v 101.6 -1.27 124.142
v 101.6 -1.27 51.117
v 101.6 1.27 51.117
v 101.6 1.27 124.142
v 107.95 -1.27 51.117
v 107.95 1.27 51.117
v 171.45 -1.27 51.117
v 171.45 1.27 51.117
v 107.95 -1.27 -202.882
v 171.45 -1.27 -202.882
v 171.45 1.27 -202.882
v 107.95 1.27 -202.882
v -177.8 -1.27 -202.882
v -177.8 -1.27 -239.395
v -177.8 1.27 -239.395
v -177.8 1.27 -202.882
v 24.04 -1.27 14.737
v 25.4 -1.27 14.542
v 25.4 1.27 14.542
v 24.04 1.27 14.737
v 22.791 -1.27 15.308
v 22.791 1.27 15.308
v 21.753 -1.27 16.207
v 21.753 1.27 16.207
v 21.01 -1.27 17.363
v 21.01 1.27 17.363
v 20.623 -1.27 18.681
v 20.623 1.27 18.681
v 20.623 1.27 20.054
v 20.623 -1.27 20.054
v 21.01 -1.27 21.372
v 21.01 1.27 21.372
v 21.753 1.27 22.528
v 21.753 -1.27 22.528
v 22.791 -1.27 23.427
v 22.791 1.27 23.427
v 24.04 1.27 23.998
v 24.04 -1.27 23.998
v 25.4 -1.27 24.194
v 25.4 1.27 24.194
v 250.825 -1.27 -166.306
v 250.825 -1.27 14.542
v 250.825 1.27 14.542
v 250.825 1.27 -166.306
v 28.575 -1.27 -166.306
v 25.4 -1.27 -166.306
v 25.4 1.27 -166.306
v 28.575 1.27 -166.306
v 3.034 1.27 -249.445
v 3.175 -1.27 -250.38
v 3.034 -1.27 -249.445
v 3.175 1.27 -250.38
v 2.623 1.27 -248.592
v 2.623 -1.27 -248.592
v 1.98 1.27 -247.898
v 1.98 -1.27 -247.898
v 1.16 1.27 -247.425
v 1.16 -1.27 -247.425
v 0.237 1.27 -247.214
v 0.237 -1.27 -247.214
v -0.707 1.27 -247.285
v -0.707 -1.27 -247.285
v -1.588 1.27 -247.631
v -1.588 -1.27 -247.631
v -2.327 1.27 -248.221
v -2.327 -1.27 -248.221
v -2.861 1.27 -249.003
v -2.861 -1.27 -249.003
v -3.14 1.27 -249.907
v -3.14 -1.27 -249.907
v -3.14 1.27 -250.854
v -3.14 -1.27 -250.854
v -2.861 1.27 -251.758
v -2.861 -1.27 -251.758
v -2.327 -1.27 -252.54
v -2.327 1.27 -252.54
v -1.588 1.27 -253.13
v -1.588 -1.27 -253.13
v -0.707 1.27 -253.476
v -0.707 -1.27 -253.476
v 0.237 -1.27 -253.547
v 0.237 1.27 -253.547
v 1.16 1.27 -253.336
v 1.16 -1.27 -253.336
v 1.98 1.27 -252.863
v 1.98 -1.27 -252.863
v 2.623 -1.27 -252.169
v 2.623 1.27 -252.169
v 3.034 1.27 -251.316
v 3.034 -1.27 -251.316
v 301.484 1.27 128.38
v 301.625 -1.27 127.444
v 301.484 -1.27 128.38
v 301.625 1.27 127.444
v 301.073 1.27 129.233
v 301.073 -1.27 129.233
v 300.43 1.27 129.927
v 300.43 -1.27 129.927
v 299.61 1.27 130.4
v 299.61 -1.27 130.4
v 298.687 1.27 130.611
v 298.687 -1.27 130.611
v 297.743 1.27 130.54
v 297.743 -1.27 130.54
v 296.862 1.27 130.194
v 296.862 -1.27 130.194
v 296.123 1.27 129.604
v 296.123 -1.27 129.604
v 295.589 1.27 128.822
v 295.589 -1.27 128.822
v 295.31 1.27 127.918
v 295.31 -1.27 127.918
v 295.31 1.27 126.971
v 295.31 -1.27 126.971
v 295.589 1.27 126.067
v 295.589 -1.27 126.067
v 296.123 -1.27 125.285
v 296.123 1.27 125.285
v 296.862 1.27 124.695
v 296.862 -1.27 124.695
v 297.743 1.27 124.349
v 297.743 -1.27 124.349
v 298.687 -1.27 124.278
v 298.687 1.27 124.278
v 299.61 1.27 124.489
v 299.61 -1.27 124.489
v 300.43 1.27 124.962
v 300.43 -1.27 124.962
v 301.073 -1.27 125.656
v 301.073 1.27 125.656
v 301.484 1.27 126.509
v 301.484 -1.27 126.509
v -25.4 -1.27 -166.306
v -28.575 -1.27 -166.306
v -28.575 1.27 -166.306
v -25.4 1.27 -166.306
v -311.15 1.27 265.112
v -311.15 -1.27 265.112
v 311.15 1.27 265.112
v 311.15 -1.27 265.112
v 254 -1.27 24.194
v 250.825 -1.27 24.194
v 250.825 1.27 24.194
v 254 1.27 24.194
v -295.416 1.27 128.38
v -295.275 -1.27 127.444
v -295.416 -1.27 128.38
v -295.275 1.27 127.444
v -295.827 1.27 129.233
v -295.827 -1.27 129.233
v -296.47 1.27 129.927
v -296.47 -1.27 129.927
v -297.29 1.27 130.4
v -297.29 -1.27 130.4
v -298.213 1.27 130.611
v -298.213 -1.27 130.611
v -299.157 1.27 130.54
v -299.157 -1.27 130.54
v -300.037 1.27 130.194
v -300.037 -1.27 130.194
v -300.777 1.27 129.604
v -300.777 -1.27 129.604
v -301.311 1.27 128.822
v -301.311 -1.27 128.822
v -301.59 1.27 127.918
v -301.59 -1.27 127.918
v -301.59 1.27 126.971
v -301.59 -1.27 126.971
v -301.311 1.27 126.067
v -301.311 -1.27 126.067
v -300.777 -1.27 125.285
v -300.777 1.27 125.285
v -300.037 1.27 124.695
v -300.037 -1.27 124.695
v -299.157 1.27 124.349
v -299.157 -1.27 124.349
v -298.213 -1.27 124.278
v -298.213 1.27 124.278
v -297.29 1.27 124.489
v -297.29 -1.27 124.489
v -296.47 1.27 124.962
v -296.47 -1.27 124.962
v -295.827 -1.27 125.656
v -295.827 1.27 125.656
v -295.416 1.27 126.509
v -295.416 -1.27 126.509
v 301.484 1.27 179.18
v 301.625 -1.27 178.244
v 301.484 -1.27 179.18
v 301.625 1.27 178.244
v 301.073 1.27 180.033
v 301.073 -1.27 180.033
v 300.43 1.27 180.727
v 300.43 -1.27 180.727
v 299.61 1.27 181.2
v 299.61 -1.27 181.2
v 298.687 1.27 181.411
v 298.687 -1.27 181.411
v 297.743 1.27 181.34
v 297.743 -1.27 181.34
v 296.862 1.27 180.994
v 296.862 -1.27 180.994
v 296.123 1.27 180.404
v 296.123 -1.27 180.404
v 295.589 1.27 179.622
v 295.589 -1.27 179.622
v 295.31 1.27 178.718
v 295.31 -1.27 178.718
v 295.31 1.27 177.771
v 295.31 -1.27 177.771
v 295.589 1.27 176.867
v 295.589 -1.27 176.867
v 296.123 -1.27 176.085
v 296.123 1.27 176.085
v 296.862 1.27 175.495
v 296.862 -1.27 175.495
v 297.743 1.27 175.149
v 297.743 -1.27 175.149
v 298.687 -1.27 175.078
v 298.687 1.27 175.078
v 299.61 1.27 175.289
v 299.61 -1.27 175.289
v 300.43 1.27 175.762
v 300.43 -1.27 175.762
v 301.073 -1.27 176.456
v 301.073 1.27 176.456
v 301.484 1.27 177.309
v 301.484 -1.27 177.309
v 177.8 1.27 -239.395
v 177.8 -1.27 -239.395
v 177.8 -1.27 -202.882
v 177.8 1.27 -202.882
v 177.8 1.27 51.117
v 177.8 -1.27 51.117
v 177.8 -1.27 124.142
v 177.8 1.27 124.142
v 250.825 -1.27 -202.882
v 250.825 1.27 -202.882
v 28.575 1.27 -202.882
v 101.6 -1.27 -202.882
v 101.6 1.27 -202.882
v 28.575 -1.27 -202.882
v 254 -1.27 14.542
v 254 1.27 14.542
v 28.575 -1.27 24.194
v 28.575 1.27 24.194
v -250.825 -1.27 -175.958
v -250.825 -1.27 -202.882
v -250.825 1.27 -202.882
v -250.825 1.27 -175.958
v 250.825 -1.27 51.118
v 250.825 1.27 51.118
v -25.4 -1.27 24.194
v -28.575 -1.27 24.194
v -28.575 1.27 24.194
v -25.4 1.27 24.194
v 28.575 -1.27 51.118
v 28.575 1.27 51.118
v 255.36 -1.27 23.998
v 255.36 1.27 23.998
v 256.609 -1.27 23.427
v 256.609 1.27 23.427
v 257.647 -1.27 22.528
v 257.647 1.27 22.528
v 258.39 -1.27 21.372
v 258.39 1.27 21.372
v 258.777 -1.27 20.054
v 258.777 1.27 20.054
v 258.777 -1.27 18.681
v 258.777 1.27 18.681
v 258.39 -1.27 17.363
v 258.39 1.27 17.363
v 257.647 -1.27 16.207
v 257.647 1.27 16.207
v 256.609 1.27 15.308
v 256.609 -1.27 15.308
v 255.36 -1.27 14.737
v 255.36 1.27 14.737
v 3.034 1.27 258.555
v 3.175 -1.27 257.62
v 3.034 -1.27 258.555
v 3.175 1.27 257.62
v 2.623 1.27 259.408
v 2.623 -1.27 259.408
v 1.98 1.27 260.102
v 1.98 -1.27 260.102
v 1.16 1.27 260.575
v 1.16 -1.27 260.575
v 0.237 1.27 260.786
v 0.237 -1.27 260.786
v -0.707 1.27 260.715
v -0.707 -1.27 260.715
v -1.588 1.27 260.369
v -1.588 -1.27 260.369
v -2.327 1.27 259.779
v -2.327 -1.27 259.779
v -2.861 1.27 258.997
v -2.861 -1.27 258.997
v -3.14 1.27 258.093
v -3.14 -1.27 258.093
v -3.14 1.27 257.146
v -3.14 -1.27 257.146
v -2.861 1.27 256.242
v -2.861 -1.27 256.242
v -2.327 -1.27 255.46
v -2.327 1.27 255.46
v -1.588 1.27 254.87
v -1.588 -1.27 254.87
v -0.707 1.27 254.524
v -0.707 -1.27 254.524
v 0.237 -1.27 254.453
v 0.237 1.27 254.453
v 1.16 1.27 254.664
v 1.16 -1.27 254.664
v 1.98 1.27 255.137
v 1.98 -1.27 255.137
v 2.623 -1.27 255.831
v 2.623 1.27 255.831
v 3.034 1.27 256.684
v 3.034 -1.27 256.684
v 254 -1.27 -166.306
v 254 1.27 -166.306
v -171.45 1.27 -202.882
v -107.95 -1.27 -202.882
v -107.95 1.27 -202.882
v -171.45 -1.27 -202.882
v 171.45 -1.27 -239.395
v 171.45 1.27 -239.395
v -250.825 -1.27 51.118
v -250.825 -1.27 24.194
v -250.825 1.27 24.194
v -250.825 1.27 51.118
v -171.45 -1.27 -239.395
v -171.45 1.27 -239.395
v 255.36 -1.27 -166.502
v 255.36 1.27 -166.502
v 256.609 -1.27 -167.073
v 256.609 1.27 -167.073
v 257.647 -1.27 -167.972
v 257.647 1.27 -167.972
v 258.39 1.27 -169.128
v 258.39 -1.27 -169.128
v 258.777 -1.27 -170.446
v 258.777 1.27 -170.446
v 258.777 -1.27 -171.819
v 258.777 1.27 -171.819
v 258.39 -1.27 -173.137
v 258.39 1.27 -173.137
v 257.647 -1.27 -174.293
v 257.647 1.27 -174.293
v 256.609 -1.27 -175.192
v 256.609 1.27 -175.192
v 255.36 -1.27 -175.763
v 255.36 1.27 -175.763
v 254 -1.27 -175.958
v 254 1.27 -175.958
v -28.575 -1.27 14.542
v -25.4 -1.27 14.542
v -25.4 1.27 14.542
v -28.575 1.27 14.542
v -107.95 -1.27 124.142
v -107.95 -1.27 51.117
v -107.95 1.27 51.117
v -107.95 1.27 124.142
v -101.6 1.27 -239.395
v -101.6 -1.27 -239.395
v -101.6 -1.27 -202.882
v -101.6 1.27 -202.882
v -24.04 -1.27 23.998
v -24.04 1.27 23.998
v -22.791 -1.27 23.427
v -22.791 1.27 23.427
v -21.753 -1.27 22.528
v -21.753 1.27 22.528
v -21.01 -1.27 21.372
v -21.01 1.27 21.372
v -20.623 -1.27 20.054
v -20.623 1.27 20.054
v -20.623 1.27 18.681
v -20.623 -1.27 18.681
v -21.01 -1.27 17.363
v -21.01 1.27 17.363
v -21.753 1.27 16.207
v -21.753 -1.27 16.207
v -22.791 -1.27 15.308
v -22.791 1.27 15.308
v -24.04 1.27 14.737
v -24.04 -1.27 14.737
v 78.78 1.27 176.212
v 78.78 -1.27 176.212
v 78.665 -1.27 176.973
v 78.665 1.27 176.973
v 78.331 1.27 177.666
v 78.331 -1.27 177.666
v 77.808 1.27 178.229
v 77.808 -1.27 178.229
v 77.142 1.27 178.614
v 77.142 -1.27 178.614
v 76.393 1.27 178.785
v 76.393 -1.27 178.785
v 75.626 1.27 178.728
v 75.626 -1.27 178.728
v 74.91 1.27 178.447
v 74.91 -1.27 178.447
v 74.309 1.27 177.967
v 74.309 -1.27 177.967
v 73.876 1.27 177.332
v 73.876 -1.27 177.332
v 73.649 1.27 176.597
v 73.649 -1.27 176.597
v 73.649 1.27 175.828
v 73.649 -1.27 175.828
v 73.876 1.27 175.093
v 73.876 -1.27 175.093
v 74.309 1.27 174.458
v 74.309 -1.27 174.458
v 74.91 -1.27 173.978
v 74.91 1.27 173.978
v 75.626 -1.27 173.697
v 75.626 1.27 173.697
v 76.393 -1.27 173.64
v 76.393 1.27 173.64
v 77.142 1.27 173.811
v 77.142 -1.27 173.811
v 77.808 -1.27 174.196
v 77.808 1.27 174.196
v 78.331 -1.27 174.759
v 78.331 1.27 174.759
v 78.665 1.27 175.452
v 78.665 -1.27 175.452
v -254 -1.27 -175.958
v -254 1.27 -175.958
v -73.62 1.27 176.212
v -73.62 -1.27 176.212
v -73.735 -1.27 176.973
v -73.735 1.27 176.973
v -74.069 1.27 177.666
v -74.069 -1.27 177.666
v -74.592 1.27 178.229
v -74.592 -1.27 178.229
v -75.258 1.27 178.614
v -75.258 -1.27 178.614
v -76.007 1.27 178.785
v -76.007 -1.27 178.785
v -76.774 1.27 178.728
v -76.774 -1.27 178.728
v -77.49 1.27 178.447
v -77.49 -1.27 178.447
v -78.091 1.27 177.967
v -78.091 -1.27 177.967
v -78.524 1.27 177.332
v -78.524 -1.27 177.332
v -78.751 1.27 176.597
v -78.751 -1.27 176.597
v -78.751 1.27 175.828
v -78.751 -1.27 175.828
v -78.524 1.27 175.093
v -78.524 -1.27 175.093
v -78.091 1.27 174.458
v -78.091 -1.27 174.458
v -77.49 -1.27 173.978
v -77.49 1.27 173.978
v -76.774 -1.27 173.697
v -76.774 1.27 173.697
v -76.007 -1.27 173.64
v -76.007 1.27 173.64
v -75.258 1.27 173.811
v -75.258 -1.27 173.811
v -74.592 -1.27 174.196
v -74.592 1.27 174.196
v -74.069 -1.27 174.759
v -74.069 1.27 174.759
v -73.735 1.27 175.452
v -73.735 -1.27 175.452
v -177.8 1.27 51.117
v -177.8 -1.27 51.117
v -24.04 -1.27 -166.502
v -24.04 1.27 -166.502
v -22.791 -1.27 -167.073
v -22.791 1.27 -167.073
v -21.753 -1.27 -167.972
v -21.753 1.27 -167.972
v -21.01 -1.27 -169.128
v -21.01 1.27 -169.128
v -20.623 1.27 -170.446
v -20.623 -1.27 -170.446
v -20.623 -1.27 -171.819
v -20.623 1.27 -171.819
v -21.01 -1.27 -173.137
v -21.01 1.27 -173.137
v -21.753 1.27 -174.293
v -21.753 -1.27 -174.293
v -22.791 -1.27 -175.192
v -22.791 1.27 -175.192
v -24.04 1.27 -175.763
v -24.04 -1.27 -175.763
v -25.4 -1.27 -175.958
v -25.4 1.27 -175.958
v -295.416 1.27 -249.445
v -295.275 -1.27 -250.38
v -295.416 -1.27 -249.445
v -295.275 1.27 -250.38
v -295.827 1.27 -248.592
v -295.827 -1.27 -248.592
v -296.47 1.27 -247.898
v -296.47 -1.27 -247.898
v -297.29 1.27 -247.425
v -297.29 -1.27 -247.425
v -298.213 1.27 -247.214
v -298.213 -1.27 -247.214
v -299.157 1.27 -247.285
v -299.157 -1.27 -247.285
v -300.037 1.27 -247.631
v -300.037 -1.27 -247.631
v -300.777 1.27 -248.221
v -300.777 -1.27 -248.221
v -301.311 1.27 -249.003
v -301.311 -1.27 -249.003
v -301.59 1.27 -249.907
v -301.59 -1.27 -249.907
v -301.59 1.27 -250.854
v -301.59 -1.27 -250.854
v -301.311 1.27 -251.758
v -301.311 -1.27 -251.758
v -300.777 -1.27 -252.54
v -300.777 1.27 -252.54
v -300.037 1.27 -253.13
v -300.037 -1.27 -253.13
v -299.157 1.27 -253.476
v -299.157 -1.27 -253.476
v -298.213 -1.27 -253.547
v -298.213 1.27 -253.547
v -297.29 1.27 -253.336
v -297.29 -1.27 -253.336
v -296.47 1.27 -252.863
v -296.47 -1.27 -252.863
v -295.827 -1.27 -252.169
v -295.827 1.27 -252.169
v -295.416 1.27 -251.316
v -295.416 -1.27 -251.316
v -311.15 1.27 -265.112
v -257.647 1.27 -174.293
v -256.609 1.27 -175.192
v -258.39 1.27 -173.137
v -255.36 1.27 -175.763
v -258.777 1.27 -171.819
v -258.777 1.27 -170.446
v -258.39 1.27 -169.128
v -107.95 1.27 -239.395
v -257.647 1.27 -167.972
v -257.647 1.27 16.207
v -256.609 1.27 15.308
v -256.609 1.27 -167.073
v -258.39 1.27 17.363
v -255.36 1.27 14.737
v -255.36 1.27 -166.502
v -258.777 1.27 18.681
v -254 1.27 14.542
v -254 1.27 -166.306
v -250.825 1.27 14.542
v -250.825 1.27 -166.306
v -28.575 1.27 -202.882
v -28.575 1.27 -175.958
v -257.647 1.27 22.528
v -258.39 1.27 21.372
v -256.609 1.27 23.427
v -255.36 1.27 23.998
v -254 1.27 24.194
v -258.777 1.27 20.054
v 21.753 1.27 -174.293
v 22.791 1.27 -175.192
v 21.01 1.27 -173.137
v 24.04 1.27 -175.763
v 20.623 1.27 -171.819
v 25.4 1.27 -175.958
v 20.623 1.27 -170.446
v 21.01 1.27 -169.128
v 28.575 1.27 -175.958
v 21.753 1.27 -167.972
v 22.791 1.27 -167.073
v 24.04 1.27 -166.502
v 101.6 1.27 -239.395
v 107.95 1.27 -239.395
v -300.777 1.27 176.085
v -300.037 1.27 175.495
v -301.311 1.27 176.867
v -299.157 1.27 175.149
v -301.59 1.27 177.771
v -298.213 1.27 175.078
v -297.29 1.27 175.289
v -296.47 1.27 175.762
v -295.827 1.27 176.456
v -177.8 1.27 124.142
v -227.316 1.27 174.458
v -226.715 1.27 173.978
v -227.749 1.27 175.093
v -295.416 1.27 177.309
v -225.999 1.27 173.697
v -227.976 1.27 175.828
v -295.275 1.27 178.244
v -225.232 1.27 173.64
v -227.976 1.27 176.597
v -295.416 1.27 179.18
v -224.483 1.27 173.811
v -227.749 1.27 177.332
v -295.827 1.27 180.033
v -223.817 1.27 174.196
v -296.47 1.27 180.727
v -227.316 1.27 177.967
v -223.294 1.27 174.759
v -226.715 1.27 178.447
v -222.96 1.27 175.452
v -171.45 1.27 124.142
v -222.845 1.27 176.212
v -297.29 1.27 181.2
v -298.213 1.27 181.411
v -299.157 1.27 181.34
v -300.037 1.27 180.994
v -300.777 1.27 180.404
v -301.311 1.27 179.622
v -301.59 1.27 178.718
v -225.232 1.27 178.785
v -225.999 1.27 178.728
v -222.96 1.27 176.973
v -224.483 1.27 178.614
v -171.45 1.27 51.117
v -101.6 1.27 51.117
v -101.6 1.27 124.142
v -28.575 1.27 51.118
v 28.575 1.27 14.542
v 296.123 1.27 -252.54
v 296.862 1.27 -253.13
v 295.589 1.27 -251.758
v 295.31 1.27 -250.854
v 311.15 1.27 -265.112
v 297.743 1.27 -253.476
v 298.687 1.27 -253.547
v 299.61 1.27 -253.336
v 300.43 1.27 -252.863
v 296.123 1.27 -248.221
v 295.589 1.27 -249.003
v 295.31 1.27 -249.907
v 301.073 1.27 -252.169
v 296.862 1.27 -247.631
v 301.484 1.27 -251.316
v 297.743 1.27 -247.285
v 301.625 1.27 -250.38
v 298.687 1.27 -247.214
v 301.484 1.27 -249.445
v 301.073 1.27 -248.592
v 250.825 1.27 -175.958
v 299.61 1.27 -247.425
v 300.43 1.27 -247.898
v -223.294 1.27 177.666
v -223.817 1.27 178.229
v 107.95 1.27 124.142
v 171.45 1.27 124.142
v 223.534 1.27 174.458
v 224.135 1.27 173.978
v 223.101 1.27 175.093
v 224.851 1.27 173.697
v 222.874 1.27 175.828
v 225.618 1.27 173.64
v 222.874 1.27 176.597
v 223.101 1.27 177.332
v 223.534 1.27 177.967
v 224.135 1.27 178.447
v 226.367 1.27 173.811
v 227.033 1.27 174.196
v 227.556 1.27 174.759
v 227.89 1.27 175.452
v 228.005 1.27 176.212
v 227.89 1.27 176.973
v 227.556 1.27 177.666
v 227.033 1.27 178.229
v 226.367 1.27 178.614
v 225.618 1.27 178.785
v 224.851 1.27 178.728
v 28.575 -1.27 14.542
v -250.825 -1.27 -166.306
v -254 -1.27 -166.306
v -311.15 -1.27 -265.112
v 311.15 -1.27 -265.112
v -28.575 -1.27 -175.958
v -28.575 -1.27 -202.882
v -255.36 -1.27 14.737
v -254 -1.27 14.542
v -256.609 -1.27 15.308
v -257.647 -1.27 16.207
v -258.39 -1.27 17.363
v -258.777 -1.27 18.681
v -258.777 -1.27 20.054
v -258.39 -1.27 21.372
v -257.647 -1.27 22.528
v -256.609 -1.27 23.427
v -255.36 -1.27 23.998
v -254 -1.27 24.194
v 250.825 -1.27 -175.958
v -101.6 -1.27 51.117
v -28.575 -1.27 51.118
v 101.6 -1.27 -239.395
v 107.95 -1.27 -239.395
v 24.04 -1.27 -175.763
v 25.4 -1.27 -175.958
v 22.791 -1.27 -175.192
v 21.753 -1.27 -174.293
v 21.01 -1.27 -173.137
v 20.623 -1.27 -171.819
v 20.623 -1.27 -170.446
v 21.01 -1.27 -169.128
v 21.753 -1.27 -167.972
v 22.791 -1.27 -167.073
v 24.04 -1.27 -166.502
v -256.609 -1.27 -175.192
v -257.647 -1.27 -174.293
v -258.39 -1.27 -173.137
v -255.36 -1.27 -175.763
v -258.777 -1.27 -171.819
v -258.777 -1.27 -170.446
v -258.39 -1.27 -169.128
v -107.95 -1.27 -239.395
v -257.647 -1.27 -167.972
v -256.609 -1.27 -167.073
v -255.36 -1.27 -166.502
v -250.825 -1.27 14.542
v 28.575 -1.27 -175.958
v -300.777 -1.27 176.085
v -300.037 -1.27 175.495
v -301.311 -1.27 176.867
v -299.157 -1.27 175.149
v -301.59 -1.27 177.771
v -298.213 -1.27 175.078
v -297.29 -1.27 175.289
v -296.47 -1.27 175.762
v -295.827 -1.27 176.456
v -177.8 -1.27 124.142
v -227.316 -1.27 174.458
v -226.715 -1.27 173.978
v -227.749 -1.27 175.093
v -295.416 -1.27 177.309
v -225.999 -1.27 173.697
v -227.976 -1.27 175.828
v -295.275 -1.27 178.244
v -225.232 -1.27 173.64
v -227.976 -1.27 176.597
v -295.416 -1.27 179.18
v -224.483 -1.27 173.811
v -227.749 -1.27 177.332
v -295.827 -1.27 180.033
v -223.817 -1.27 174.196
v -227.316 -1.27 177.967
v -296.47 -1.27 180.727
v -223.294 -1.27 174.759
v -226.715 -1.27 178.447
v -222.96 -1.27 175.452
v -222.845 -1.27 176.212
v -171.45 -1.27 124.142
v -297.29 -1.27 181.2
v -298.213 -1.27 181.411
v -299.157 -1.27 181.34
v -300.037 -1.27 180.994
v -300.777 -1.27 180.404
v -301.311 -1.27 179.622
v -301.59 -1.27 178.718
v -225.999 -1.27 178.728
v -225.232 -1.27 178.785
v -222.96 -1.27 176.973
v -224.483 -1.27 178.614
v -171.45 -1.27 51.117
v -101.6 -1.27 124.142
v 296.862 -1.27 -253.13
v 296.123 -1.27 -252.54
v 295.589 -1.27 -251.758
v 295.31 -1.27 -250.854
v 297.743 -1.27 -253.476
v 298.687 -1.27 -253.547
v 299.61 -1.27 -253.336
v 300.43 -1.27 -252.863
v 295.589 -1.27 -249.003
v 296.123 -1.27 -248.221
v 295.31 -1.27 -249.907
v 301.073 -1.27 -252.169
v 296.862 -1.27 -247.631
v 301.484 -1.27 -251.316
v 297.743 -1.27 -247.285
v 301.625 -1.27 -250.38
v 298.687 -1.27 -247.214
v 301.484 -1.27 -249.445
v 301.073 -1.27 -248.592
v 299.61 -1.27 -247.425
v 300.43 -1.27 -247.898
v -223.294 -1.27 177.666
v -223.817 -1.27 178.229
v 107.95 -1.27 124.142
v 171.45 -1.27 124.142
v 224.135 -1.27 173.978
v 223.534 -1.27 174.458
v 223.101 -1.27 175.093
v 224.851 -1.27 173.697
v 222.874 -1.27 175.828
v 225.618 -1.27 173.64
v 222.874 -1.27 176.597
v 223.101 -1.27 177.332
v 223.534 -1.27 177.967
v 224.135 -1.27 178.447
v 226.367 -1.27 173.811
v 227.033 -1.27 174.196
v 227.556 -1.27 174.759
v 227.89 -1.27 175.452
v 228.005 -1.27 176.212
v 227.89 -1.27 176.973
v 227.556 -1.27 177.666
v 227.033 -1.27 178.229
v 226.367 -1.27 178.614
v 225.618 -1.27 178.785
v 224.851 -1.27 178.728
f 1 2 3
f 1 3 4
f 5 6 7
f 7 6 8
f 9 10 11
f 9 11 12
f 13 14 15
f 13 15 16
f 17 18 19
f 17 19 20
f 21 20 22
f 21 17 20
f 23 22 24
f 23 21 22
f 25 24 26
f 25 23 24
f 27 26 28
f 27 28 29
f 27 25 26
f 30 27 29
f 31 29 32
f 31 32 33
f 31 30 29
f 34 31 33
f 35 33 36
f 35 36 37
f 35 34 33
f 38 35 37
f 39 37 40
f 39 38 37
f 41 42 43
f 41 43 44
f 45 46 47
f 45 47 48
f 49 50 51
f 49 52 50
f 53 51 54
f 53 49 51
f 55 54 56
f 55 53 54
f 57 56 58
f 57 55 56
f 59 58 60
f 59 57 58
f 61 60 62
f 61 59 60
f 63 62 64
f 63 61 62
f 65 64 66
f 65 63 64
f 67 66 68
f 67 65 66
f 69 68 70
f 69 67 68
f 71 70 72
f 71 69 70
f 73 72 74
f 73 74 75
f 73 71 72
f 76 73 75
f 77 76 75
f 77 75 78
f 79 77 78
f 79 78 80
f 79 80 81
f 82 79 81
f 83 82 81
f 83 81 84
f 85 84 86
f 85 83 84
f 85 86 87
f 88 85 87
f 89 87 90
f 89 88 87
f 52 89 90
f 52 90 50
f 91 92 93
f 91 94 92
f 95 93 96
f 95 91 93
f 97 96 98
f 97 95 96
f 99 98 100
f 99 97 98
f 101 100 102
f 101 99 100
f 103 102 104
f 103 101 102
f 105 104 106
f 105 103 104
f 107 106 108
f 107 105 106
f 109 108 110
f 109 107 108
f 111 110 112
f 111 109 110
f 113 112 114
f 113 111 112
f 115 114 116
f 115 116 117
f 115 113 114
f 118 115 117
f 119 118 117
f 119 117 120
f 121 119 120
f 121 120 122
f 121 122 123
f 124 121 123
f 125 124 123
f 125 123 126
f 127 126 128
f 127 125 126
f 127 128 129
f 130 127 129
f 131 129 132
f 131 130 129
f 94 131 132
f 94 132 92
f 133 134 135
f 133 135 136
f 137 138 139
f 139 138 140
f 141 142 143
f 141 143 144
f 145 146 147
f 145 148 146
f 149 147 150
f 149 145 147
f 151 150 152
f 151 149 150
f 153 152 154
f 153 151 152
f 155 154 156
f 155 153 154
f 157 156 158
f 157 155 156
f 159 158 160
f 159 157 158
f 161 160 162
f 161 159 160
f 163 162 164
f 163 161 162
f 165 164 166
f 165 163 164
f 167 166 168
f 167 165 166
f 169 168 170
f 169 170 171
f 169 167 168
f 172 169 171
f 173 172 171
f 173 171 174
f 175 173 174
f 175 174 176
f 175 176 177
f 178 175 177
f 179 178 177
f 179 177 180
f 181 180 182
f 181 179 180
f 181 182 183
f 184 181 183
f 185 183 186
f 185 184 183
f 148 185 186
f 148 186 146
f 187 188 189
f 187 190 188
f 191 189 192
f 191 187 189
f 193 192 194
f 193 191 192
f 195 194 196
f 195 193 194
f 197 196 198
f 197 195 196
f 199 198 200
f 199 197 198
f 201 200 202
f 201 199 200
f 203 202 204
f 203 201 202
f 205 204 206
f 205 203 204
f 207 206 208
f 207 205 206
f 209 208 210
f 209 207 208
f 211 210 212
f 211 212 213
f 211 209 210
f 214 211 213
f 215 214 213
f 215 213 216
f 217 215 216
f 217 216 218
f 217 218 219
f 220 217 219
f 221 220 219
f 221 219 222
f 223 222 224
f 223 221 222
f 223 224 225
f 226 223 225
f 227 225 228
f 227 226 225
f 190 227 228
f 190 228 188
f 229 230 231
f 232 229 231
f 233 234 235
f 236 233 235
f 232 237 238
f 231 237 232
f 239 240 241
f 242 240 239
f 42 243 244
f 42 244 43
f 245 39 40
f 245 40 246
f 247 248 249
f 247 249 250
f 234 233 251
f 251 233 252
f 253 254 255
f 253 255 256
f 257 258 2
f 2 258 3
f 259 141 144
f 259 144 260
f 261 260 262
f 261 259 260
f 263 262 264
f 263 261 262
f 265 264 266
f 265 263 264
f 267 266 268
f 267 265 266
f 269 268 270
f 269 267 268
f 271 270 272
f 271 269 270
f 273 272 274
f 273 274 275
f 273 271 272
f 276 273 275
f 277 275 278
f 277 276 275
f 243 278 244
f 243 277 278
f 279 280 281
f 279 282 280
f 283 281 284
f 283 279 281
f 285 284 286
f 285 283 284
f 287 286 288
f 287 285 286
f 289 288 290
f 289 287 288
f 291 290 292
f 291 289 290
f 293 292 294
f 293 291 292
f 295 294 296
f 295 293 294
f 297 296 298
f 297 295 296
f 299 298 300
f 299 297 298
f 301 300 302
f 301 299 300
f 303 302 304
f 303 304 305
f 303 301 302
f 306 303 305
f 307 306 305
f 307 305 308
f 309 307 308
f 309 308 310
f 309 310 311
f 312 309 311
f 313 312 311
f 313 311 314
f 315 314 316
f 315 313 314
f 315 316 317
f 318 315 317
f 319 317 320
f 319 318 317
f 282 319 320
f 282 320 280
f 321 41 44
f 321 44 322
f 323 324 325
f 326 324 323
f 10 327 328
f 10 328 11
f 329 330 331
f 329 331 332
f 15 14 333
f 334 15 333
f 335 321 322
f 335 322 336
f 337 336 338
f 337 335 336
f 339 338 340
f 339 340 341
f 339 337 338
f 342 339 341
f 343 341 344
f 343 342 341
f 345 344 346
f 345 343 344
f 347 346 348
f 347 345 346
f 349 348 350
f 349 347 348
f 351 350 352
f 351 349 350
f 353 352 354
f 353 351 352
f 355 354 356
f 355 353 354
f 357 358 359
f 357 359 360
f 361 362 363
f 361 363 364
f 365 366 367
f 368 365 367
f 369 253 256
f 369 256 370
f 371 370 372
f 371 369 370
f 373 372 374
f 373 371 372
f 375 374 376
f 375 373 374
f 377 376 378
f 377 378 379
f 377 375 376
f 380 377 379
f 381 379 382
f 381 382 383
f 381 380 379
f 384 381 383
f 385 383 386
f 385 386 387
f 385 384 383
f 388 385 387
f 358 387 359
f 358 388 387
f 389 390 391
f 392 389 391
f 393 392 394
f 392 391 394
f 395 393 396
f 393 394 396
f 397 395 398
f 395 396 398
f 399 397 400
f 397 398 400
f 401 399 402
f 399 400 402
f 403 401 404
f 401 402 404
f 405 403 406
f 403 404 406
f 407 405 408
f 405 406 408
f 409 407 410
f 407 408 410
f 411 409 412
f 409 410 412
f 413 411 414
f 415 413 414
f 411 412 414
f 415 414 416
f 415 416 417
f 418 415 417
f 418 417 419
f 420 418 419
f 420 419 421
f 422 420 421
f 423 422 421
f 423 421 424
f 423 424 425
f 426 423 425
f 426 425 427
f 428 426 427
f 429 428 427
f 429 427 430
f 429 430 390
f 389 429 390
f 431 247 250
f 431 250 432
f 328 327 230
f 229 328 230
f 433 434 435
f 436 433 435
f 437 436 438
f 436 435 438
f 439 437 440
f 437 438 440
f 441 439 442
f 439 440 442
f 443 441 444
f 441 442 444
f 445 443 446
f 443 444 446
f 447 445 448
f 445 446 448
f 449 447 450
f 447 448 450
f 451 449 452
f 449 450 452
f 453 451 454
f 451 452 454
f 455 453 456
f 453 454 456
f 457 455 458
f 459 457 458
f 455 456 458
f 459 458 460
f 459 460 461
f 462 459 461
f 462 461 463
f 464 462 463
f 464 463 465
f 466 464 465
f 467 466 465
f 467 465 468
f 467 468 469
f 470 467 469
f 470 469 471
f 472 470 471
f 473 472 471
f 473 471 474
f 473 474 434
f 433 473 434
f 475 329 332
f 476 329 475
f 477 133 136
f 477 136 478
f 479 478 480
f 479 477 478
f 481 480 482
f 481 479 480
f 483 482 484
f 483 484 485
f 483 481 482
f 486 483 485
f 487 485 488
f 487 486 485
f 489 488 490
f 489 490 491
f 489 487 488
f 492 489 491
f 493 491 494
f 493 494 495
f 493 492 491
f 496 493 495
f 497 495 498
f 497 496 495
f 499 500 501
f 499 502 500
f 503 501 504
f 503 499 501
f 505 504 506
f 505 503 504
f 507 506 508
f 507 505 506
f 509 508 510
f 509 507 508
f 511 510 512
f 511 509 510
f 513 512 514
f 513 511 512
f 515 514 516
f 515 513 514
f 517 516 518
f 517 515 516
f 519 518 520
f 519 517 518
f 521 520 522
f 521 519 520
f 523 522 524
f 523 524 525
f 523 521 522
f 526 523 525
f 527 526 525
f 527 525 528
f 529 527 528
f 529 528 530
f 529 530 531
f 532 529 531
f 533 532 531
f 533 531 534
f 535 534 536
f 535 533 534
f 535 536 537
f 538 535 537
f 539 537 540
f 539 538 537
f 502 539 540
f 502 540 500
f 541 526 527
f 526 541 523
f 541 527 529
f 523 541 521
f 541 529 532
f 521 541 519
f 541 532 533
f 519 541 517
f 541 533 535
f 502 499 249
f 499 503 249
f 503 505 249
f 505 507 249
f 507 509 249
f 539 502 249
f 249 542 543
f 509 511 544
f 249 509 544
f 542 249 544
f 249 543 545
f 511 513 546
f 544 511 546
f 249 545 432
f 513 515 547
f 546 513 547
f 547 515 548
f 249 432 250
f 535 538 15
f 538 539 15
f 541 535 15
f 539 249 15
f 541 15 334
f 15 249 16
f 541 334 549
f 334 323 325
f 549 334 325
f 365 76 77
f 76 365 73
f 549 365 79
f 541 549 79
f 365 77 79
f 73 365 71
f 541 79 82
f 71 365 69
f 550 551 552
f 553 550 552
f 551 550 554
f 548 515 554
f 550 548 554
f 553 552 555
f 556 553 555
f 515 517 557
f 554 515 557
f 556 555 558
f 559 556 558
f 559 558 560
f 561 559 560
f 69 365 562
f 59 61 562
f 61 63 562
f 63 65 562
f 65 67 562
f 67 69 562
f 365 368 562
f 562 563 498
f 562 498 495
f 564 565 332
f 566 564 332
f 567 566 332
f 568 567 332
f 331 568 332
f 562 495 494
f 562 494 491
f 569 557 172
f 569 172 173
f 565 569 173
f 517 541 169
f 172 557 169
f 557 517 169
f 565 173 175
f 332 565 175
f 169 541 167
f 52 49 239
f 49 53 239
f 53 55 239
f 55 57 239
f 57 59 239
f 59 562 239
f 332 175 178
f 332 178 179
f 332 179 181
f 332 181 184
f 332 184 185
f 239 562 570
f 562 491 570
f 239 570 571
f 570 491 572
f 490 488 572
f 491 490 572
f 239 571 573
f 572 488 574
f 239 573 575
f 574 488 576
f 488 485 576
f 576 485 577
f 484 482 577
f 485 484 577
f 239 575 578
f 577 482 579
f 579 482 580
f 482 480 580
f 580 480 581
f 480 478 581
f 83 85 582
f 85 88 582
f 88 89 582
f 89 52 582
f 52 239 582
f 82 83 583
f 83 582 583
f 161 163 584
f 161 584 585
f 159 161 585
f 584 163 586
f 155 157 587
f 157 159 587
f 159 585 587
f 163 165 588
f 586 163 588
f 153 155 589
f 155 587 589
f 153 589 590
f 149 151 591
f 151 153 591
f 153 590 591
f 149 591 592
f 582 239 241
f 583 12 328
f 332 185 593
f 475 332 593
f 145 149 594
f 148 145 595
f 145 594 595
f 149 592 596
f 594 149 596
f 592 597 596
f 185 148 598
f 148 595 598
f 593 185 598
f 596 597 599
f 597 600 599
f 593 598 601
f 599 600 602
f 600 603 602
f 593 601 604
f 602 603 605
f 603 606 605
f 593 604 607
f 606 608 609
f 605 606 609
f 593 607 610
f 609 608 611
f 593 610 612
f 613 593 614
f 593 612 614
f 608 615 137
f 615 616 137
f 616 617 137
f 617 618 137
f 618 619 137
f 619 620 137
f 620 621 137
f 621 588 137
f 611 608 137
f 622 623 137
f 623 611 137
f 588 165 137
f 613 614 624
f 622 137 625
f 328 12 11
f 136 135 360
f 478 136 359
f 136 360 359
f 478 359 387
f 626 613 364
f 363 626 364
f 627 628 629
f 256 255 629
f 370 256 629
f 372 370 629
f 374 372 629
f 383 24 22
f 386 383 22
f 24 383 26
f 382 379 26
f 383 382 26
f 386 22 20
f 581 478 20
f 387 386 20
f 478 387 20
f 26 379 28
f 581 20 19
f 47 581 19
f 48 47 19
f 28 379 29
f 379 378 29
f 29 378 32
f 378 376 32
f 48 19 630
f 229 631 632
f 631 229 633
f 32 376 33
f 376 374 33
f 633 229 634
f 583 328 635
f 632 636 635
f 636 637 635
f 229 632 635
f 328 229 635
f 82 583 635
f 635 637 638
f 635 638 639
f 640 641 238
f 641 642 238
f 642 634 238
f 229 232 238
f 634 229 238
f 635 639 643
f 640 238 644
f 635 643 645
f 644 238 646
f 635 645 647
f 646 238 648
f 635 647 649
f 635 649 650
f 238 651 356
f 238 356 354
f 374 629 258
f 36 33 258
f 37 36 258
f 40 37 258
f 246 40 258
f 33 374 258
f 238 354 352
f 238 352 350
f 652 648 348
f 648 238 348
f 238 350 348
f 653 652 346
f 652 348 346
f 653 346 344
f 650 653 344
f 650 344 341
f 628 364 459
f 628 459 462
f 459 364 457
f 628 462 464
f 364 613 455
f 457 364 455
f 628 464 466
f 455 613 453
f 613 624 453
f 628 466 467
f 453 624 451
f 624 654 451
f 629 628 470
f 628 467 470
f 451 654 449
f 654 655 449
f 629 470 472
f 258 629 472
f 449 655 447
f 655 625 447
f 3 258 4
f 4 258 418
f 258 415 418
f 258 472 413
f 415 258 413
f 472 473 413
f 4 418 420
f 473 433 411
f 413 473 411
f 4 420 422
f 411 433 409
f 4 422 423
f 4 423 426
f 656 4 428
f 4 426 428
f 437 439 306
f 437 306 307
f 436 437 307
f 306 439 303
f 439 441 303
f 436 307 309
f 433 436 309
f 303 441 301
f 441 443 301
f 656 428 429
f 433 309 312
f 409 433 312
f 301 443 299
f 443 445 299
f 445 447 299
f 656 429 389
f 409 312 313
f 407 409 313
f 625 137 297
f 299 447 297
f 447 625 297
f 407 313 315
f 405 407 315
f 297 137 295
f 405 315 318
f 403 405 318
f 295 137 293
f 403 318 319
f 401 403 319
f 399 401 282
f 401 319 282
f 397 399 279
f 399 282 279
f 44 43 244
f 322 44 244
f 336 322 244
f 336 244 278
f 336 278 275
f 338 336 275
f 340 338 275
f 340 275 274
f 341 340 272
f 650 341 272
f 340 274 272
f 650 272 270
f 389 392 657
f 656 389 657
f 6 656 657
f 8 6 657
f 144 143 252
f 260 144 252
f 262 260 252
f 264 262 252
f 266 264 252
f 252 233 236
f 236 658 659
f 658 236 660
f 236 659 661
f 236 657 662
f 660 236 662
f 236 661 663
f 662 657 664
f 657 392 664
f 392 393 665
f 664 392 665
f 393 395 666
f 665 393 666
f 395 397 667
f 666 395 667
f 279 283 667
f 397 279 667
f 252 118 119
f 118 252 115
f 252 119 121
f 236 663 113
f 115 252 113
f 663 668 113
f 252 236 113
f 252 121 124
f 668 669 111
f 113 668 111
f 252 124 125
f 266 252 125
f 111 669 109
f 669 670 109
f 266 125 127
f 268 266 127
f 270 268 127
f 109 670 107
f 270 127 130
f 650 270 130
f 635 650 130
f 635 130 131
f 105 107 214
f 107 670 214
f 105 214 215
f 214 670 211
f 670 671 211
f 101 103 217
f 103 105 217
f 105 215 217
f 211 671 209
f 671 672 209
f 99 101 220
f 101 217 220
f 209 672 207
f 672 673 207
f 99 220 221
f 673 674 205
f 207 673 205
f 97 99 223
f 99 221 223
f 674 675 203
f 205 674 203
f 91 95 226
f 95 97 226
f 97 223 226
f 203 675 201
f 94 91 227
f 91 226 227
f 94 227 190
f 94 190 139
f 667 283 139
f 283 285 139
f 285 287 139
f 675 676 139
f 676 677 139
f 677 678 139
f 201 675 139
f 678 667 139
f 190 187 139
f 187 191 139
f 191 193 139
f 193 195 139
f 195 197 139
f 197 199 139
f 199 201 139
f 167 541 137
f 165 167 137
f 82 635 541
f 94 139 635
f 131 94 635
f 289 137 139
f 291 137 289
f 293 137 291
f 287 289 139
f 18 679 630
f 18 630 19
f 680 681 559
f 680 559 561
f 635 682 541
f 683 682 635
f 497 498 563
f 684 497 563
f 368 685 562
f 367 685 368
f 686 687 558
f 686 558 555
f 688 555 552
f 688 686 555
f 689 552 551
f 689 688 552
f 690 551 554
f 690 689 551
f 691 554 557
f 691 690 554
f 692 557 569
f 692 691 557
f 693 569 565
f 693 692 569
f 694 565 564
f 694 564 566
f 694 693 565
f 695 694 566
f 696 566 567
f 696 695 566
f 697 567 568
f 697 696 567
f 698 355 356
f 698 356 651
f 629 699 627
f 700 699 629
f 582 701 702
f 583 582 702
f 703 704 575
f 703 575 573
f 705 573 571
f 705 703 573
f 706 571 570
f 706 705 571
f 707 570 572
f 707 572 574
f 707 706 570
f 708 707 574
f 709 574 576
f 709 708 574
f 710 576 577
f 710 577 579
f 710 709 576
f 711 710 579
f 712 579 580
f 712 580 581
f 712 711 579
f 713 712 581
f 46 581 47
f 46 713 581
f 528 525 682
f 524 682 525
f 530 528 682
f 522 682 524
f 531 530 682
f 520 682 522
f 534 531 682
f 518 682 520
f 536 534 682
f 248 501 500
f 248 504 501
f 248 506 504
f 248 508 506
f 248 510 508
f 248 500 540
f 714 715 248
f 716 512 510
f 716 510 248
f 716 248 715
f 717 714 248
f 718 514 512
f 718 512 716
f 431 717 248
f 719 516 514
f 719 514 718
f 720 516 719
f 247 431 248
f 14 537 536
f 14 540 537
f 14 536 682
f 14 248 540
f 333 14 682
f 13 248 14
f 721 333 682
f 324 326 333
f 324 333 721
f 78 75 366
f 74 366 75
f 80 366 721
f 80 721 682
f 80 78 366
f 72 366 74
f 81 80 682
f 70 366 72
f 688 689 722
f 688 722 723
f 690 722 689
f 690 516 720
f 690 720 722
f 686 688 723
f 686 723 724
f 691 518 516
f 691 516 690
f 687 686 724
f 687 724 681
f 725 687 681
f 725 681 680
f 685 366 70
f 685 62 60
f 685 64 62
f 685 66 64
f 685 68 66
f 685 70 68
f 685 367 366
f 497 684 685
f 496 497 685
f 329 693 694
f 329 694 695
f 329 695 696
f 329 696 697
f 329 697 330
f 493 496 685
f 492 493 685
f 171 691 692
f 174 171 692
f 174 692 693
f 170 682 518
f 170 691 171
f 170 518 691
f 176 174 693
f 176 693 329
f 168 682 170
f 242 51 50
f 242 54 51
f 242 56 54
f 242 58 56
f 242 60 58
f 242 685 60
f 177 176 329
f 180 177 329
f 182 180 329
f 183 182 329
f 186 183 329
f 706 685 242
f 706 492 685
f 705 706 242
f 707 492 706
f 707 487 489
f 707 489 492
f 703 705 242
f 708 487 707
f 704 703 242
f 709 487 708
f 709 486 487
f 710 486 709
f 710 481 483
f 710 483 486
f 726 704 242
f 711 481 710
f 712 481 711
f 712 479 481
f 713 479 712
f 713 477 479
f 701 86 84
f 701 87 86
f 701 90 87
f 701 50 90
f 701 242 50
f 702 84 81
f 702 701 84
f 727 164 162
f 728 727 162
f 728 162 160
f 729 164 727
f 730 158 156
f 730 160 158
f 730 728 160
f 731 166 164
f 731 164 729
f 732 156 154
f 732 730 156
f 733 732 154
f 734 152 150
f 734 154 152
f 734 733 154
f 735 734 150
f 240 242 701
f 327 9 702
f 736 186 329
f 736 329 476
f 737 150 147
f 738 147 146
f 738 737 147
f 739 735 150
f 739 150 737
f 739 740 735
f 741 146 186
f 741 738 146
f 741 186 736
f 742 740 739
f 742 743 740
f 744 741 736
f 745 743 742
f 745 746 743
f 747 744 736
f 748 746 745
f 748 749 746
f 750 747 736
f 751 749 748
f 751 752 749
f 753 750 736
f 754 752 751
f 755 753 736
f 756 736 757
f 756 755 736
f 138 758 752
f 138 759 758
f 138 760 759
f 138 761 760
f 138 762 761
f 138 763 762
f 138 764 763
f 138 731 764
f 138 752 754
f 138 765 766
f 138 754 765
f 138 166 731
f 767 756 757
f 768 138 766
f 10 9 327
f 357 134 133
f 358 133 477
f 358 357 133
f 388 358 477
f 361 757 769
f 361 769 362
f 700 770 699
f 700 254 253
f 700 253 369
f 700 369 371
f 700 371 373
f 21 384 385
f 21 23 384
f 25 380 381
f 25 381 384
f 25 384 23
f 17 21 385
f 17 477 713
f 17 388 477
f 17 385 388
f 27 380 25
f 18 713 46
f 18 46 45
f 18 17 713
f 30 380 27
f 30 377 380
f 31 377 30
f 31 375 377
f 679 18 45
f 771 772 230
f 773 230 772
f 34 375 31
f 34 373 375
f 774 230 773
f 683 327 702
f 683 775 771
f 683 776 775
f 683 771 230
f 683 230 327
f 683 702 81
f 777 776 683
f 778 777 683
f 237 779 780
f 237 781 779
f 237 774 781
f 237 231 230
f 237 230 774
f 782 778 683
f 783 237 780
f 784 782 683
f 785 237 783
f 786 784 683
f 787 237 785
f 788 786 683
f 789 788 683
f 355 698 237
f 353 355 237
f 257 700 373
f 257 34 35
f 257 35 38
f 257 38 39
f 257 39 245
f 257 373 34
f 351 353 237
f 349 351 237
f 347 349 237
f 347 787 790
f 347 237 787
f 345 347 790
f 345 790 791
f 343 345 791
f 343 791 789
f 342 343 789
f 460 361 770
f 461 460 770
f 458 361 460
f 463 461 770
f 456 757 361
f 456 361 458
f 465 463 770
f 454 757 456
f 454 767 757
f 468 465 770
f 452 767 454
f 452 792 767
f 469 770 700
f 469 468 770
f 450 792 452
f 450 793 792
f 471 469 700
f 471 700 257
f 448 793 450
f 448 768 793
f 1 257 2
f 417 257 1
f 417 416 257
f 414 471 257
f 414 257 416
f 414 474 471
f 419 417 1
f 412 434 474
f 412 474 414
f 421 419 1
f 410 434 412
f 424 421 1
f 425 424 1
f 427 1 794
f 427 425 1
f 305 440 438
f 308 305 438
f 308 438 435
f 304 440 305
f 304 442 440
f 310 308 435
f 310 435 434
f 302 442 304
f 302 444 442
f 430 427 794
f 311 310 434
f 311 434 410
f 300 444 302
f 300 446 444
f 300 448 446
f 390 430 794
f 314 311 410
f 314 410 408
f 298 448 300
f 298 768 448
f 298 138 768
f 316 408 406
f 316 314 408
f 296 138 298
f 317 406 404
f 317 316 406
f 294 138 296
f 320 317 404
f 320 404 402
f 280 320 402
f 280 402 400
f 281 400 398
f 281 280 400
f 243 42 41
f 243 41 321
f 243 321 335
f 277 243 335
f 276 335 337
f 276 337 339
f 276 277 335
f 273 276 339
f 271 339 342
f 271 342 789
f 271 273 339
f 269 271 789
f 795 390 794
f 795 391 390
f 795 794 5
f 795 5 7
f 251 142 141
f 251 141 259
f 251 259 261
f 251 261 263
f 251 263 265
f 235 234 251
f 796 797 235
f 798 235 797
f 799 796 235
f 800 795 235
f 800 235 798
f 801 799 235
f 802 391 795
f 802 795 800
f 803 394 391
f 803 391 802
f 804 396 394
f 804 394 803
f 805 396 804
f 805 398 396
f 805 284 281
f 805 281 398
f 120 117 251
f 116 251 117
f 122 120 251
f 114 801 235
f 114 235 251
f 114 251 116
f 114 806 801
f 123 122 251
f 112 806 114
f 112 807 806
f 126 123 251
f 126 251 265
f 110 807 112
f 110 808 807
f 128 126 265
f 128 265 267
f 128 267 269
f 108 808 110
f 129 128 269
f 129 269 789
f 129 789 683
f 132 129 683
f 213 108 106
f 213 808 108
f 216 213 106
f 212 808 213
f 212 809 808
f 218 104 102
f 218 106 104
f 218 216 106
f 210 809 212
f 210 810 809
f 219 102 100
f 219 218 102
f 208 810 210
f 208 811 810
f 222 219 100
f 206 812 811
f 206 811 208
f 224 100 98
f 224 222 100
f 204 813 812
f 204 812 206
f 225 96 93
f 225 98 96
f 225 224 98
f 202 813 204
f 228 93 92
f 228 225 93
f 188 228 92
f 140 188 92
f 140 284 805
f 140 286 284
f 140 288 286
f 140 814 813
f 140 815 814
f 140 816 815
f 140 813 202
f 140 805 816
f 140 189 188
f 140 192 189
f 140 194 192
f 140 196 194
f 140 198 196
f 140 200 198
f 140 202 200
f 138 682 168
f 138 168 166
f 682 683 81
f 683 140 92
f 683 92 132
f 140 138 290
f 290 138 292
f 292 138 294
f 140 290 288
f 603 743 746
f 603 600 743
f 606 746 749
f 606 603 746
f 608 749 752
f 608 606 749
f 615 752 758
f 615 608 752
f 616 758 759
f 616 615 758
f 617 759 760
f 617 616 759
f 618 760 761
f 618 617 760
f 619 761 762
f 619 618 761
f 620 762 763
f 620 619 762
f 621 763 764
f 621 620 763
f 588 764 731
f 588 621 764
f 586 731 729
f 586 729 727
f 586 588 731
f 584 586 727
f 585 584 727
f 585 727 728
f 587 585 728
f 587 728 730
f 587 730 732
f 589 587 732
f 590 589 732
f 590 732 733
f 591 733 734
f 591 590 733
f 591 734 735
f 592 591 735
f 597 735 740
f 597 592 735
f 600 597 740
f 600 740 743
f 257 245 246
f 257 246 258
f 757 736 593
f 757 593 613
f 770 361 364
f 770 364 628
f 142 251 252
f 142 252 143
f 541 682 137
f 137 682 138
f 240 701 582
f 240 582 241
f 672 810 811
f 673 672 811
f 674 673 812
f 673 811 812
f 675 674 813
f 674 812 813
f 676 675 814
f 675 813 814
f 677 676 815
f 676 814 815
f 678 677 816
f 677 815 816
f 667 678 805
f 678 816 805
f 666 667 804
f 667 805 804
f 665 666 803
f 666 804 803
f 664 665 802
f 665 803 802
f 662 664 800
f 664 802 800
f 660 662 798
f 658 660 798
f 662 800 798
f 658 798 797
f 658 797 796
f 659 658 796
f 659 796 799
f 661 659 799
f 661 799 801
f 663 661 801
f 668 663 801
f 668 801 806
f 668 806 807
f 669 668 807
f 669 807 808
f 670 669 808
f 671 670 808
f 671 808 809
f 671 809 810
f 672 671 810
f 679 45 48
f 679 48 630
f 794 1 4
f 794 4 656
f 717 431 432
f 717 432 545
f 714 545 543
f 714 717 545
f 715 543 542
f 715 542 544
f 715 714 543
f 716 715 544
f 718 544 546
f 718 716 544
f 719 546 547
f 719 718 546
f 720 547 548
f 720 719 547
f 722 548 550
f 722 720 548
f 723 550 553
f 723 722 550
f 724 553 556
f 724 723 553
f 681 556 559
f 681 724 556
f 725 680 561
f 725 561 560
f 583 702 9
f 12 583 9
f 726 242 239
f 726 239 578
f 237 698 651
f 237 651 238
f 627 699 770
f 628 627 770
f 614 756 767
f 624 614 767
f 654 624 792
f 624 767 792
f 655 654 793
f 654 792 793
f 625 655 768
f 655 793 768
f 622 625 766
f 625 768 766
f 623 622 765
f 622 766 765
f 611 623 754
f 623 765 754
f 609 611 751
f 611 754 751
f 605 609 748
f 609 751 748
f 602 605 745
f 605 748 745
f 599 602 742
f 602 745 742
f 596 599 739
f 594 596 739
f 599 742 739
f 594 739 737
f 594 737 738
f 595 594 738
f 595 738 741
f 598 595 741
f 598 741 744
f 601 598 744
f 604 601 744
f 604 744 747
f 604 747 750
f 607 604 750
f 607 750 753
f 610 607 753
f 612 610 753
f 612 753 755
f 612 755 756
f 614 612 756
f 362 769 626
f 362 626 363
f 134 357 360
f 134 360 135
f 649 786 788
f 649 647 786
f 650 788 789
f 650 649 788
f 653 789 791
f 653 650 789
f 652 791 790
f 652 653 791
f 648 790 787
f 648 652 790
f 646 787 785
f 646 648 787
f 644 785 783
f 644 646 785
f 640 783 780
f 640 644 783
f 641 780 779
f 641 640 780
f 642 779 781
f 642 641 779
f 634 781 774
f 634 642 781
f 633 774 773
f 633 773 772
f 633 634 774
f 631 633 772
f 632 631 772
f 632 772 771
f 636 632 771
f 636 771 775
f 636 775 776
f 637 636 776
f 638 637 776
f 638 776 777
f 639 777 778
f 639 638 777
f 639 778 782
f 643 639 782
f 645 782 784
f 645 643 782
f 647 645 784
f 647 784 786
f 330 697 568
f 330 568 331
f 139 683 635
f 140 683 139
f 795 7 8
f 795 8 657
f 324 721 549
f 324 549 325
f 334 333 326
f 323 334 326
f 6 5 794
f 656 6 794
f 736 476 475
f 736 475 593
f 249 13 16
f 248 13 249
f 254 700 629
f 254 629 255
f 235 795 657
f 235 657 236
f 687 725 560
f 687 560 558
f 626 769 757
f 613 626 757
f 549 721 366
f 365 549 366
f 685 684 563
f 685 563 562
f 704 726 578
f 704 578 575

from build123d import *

# Parameters (mm, degrees)
F0_W     = 622.3
F0_H     = 530.225
F0_R     = 3.175
F1_DEPTH = 1.27
F2_W     = 6.35
F2_H     = 73.025
F2_H_2   = 36.5125
F2_R     = 2.579688
F3_DEPTH = 2.541


with BuildPart() as f1:
    # F0 (on Front) → F1 (new body, symmetric)
    with BuildSketch(Plane.XZ):
        Rectangle(F0_W, F0_H)
        with Locations((-298.45, -250.3805)):
            Circle(F0_R, mode=Mode.SUBTRACT)
        with BuildLine():
            Line((-250.825, 24.1935), (-250.825, 51.1175))
            Line((-250.825, 51.1175), (-28.575, 51.1175))
            Line((-28.575, 51.1175), (-28.575, 24.1935))
            Line((-28.575, 24.1935), (-25.4, 24.1935))
            ThreePointArc((-25.4, 24.1935), (-20.574, 19.3675), (-25.4, 14.5415))
            Line((-25.4, 14.5415), (-28.575, 14.5415))
            Line((-28.575, 14.5415), (-28.575, -166.3065))
            Line((-28.575, -166.3065), (-25.4, -166.3065))
            ThreePointArc((-25.4, -166.3065), (-20.574, -171.1325), (-25.4, -175.9585))
            Line((-25.4, -175.9585), (-28.575, -175.9585))
            Line((-28.575, -175.9585), (-28.575, -202.8825))
            Line((-28.575, -202.8825), (-250.825, -202.8825))
            Line((-250.825, -202.8825), (-250.825, -175.9585))
            Line((-250.825, -175.9585), (-254, -175.9585))
            ThreePointArc((-254, -175.9585), (-258.826, -171.1325), (-254, -166.3065))
            Line((-254, -166.3065), (-250.825, -166.3065))
            Line((-250.825, -166.3065), (-250.825, 14.5415))
            Line((-250.825, 14.5415), (-254, 14.5415))
            ThreePointArc((-254, 14.5415), (-258.826, 19.3675), (-254, 24.1935))
            Line((-254, 24.1935), (-250.825, 24.1935))
        make_face(mode=Mode.SUBTRACT)
        with Locations((0, -250.3805)):
            Circle(F0_R, mode=Mode.SUBTRACT)
        with Locations((298.45, -250.3805)):
            Circle(F0_R, mode=Mode.SUBTRACT)
        with BuildLine():
            Line((28.575, -202.8825), (28.575, -175.9585))
            Line((28.575, -175.9585), (25.4, -175.9585))
            ThreePointArc((25.4, -175.9585), (20.574, -171.1325), (25.4, -166.3065))
            Line((25.4, -166.3065), (28.575, -166.3065))
            Line((28.575, -166.3065), (28.575, 14.5415))
            Line((28.575, 14.5415), (25.4, 14.5415))
            ThreePointArc((25.4, 14.5415), (20.574, 19.3675), (25.4, 24.1935))
            Line((25.4, 24.1935), (28.575, 24.1935))
            Line((28.575, 24.1935), (28.575, 51.1175))
            Line((28.575, 51.1175), (250.825, 51.1175))
            Line((250.825, 51.1175), (250.825, 24.1935))
            Line((250.825, 24.1935), (254, 24.1935))
            ThreePointArc((254, 24.1935), (258.826, 19.3675), (254, 14.5415))
            Line((254, 14.5415), (250.825, 14.5415))
            Line((250.825, 14.5415), (250.825, -166.3065))
            Line((250.825, -166.3065), (254, -166.3065))
            ThreePointArc((254, -166.3065), (258.826, -171.1325), (254, -175.9585))
            Line((254, -175.9585), (250.825, -175.9585))
            Line((250.825, -175.9585), (250.825, -202.8825))
            Line((250.825, -202.8825), (28.575, -202.8825))
        make_face(mode=Mode.SUBTRACT)
        with Locations((-298.45, 127.4445)):
            Circle(F0_R, mode=Mode.SUBTRACT)
        with Locations((-298.45, 178.2445)):
            Circle(F0_R, mode=Mode.SUBTRACT)
        with Locations((298.45, 127.4445)):
            Circle(F0_R, mode=Mode.SUBTRACT)
        with Locations((0, 257.6195)):
            Circle(F0_R, mode=Mode.SUBTRACT)
        with Locations((298.45, 178.2445)):
            Circle(F0_R, mode=Mode.SUBTRACT)
    extrude(amount=F1_DEPTH, both=True)

    # F2 (on face) → F3 (cut, through all)
    with BuildSketch(Plane.XZ.offset(1.27)):
        with Locations((-174.625, 87.63)):
            Rectangle(F2_W, F2_H)
        with Locations((-104.775, 87.63)):
            Rectangle(F2_W, F2_H)
        with Locations((-104.775, -221.13875)):
            Rectangle(F2_W, F2_H_2)
        with Locations((-174.625, -221.13875)):
            Rectangle(F2_W, F2_H_2)
        with Locations((104.775, 87.63)):
            Rectangle(F2_W, F2_H)
        with Locations((174.625, -221.13875)):
            Rectangle(F2_W, F2_H_2)
        with Locations((174.625, 87.63)):
            Rectangle(F2_W, F2_H)
        with Locations((104.775, -221.13875)):
            Rectangle(F2_W, F2_H_2)
        with Locations((225.425, 176.2125)):
            Circle(F2_R)
        with Locations((-225.425, 176.2125)):
            Circle(F2_R)
        with Locations((76.2, 176.2125)):
            Circle(F2_R)
        with Locations((-76.2, 176.2125)):
            Circle(F2_R)
    extrude(amount=-F3_DEPTH, mode=Mode.SUBTRACT)


solid = f1.part
